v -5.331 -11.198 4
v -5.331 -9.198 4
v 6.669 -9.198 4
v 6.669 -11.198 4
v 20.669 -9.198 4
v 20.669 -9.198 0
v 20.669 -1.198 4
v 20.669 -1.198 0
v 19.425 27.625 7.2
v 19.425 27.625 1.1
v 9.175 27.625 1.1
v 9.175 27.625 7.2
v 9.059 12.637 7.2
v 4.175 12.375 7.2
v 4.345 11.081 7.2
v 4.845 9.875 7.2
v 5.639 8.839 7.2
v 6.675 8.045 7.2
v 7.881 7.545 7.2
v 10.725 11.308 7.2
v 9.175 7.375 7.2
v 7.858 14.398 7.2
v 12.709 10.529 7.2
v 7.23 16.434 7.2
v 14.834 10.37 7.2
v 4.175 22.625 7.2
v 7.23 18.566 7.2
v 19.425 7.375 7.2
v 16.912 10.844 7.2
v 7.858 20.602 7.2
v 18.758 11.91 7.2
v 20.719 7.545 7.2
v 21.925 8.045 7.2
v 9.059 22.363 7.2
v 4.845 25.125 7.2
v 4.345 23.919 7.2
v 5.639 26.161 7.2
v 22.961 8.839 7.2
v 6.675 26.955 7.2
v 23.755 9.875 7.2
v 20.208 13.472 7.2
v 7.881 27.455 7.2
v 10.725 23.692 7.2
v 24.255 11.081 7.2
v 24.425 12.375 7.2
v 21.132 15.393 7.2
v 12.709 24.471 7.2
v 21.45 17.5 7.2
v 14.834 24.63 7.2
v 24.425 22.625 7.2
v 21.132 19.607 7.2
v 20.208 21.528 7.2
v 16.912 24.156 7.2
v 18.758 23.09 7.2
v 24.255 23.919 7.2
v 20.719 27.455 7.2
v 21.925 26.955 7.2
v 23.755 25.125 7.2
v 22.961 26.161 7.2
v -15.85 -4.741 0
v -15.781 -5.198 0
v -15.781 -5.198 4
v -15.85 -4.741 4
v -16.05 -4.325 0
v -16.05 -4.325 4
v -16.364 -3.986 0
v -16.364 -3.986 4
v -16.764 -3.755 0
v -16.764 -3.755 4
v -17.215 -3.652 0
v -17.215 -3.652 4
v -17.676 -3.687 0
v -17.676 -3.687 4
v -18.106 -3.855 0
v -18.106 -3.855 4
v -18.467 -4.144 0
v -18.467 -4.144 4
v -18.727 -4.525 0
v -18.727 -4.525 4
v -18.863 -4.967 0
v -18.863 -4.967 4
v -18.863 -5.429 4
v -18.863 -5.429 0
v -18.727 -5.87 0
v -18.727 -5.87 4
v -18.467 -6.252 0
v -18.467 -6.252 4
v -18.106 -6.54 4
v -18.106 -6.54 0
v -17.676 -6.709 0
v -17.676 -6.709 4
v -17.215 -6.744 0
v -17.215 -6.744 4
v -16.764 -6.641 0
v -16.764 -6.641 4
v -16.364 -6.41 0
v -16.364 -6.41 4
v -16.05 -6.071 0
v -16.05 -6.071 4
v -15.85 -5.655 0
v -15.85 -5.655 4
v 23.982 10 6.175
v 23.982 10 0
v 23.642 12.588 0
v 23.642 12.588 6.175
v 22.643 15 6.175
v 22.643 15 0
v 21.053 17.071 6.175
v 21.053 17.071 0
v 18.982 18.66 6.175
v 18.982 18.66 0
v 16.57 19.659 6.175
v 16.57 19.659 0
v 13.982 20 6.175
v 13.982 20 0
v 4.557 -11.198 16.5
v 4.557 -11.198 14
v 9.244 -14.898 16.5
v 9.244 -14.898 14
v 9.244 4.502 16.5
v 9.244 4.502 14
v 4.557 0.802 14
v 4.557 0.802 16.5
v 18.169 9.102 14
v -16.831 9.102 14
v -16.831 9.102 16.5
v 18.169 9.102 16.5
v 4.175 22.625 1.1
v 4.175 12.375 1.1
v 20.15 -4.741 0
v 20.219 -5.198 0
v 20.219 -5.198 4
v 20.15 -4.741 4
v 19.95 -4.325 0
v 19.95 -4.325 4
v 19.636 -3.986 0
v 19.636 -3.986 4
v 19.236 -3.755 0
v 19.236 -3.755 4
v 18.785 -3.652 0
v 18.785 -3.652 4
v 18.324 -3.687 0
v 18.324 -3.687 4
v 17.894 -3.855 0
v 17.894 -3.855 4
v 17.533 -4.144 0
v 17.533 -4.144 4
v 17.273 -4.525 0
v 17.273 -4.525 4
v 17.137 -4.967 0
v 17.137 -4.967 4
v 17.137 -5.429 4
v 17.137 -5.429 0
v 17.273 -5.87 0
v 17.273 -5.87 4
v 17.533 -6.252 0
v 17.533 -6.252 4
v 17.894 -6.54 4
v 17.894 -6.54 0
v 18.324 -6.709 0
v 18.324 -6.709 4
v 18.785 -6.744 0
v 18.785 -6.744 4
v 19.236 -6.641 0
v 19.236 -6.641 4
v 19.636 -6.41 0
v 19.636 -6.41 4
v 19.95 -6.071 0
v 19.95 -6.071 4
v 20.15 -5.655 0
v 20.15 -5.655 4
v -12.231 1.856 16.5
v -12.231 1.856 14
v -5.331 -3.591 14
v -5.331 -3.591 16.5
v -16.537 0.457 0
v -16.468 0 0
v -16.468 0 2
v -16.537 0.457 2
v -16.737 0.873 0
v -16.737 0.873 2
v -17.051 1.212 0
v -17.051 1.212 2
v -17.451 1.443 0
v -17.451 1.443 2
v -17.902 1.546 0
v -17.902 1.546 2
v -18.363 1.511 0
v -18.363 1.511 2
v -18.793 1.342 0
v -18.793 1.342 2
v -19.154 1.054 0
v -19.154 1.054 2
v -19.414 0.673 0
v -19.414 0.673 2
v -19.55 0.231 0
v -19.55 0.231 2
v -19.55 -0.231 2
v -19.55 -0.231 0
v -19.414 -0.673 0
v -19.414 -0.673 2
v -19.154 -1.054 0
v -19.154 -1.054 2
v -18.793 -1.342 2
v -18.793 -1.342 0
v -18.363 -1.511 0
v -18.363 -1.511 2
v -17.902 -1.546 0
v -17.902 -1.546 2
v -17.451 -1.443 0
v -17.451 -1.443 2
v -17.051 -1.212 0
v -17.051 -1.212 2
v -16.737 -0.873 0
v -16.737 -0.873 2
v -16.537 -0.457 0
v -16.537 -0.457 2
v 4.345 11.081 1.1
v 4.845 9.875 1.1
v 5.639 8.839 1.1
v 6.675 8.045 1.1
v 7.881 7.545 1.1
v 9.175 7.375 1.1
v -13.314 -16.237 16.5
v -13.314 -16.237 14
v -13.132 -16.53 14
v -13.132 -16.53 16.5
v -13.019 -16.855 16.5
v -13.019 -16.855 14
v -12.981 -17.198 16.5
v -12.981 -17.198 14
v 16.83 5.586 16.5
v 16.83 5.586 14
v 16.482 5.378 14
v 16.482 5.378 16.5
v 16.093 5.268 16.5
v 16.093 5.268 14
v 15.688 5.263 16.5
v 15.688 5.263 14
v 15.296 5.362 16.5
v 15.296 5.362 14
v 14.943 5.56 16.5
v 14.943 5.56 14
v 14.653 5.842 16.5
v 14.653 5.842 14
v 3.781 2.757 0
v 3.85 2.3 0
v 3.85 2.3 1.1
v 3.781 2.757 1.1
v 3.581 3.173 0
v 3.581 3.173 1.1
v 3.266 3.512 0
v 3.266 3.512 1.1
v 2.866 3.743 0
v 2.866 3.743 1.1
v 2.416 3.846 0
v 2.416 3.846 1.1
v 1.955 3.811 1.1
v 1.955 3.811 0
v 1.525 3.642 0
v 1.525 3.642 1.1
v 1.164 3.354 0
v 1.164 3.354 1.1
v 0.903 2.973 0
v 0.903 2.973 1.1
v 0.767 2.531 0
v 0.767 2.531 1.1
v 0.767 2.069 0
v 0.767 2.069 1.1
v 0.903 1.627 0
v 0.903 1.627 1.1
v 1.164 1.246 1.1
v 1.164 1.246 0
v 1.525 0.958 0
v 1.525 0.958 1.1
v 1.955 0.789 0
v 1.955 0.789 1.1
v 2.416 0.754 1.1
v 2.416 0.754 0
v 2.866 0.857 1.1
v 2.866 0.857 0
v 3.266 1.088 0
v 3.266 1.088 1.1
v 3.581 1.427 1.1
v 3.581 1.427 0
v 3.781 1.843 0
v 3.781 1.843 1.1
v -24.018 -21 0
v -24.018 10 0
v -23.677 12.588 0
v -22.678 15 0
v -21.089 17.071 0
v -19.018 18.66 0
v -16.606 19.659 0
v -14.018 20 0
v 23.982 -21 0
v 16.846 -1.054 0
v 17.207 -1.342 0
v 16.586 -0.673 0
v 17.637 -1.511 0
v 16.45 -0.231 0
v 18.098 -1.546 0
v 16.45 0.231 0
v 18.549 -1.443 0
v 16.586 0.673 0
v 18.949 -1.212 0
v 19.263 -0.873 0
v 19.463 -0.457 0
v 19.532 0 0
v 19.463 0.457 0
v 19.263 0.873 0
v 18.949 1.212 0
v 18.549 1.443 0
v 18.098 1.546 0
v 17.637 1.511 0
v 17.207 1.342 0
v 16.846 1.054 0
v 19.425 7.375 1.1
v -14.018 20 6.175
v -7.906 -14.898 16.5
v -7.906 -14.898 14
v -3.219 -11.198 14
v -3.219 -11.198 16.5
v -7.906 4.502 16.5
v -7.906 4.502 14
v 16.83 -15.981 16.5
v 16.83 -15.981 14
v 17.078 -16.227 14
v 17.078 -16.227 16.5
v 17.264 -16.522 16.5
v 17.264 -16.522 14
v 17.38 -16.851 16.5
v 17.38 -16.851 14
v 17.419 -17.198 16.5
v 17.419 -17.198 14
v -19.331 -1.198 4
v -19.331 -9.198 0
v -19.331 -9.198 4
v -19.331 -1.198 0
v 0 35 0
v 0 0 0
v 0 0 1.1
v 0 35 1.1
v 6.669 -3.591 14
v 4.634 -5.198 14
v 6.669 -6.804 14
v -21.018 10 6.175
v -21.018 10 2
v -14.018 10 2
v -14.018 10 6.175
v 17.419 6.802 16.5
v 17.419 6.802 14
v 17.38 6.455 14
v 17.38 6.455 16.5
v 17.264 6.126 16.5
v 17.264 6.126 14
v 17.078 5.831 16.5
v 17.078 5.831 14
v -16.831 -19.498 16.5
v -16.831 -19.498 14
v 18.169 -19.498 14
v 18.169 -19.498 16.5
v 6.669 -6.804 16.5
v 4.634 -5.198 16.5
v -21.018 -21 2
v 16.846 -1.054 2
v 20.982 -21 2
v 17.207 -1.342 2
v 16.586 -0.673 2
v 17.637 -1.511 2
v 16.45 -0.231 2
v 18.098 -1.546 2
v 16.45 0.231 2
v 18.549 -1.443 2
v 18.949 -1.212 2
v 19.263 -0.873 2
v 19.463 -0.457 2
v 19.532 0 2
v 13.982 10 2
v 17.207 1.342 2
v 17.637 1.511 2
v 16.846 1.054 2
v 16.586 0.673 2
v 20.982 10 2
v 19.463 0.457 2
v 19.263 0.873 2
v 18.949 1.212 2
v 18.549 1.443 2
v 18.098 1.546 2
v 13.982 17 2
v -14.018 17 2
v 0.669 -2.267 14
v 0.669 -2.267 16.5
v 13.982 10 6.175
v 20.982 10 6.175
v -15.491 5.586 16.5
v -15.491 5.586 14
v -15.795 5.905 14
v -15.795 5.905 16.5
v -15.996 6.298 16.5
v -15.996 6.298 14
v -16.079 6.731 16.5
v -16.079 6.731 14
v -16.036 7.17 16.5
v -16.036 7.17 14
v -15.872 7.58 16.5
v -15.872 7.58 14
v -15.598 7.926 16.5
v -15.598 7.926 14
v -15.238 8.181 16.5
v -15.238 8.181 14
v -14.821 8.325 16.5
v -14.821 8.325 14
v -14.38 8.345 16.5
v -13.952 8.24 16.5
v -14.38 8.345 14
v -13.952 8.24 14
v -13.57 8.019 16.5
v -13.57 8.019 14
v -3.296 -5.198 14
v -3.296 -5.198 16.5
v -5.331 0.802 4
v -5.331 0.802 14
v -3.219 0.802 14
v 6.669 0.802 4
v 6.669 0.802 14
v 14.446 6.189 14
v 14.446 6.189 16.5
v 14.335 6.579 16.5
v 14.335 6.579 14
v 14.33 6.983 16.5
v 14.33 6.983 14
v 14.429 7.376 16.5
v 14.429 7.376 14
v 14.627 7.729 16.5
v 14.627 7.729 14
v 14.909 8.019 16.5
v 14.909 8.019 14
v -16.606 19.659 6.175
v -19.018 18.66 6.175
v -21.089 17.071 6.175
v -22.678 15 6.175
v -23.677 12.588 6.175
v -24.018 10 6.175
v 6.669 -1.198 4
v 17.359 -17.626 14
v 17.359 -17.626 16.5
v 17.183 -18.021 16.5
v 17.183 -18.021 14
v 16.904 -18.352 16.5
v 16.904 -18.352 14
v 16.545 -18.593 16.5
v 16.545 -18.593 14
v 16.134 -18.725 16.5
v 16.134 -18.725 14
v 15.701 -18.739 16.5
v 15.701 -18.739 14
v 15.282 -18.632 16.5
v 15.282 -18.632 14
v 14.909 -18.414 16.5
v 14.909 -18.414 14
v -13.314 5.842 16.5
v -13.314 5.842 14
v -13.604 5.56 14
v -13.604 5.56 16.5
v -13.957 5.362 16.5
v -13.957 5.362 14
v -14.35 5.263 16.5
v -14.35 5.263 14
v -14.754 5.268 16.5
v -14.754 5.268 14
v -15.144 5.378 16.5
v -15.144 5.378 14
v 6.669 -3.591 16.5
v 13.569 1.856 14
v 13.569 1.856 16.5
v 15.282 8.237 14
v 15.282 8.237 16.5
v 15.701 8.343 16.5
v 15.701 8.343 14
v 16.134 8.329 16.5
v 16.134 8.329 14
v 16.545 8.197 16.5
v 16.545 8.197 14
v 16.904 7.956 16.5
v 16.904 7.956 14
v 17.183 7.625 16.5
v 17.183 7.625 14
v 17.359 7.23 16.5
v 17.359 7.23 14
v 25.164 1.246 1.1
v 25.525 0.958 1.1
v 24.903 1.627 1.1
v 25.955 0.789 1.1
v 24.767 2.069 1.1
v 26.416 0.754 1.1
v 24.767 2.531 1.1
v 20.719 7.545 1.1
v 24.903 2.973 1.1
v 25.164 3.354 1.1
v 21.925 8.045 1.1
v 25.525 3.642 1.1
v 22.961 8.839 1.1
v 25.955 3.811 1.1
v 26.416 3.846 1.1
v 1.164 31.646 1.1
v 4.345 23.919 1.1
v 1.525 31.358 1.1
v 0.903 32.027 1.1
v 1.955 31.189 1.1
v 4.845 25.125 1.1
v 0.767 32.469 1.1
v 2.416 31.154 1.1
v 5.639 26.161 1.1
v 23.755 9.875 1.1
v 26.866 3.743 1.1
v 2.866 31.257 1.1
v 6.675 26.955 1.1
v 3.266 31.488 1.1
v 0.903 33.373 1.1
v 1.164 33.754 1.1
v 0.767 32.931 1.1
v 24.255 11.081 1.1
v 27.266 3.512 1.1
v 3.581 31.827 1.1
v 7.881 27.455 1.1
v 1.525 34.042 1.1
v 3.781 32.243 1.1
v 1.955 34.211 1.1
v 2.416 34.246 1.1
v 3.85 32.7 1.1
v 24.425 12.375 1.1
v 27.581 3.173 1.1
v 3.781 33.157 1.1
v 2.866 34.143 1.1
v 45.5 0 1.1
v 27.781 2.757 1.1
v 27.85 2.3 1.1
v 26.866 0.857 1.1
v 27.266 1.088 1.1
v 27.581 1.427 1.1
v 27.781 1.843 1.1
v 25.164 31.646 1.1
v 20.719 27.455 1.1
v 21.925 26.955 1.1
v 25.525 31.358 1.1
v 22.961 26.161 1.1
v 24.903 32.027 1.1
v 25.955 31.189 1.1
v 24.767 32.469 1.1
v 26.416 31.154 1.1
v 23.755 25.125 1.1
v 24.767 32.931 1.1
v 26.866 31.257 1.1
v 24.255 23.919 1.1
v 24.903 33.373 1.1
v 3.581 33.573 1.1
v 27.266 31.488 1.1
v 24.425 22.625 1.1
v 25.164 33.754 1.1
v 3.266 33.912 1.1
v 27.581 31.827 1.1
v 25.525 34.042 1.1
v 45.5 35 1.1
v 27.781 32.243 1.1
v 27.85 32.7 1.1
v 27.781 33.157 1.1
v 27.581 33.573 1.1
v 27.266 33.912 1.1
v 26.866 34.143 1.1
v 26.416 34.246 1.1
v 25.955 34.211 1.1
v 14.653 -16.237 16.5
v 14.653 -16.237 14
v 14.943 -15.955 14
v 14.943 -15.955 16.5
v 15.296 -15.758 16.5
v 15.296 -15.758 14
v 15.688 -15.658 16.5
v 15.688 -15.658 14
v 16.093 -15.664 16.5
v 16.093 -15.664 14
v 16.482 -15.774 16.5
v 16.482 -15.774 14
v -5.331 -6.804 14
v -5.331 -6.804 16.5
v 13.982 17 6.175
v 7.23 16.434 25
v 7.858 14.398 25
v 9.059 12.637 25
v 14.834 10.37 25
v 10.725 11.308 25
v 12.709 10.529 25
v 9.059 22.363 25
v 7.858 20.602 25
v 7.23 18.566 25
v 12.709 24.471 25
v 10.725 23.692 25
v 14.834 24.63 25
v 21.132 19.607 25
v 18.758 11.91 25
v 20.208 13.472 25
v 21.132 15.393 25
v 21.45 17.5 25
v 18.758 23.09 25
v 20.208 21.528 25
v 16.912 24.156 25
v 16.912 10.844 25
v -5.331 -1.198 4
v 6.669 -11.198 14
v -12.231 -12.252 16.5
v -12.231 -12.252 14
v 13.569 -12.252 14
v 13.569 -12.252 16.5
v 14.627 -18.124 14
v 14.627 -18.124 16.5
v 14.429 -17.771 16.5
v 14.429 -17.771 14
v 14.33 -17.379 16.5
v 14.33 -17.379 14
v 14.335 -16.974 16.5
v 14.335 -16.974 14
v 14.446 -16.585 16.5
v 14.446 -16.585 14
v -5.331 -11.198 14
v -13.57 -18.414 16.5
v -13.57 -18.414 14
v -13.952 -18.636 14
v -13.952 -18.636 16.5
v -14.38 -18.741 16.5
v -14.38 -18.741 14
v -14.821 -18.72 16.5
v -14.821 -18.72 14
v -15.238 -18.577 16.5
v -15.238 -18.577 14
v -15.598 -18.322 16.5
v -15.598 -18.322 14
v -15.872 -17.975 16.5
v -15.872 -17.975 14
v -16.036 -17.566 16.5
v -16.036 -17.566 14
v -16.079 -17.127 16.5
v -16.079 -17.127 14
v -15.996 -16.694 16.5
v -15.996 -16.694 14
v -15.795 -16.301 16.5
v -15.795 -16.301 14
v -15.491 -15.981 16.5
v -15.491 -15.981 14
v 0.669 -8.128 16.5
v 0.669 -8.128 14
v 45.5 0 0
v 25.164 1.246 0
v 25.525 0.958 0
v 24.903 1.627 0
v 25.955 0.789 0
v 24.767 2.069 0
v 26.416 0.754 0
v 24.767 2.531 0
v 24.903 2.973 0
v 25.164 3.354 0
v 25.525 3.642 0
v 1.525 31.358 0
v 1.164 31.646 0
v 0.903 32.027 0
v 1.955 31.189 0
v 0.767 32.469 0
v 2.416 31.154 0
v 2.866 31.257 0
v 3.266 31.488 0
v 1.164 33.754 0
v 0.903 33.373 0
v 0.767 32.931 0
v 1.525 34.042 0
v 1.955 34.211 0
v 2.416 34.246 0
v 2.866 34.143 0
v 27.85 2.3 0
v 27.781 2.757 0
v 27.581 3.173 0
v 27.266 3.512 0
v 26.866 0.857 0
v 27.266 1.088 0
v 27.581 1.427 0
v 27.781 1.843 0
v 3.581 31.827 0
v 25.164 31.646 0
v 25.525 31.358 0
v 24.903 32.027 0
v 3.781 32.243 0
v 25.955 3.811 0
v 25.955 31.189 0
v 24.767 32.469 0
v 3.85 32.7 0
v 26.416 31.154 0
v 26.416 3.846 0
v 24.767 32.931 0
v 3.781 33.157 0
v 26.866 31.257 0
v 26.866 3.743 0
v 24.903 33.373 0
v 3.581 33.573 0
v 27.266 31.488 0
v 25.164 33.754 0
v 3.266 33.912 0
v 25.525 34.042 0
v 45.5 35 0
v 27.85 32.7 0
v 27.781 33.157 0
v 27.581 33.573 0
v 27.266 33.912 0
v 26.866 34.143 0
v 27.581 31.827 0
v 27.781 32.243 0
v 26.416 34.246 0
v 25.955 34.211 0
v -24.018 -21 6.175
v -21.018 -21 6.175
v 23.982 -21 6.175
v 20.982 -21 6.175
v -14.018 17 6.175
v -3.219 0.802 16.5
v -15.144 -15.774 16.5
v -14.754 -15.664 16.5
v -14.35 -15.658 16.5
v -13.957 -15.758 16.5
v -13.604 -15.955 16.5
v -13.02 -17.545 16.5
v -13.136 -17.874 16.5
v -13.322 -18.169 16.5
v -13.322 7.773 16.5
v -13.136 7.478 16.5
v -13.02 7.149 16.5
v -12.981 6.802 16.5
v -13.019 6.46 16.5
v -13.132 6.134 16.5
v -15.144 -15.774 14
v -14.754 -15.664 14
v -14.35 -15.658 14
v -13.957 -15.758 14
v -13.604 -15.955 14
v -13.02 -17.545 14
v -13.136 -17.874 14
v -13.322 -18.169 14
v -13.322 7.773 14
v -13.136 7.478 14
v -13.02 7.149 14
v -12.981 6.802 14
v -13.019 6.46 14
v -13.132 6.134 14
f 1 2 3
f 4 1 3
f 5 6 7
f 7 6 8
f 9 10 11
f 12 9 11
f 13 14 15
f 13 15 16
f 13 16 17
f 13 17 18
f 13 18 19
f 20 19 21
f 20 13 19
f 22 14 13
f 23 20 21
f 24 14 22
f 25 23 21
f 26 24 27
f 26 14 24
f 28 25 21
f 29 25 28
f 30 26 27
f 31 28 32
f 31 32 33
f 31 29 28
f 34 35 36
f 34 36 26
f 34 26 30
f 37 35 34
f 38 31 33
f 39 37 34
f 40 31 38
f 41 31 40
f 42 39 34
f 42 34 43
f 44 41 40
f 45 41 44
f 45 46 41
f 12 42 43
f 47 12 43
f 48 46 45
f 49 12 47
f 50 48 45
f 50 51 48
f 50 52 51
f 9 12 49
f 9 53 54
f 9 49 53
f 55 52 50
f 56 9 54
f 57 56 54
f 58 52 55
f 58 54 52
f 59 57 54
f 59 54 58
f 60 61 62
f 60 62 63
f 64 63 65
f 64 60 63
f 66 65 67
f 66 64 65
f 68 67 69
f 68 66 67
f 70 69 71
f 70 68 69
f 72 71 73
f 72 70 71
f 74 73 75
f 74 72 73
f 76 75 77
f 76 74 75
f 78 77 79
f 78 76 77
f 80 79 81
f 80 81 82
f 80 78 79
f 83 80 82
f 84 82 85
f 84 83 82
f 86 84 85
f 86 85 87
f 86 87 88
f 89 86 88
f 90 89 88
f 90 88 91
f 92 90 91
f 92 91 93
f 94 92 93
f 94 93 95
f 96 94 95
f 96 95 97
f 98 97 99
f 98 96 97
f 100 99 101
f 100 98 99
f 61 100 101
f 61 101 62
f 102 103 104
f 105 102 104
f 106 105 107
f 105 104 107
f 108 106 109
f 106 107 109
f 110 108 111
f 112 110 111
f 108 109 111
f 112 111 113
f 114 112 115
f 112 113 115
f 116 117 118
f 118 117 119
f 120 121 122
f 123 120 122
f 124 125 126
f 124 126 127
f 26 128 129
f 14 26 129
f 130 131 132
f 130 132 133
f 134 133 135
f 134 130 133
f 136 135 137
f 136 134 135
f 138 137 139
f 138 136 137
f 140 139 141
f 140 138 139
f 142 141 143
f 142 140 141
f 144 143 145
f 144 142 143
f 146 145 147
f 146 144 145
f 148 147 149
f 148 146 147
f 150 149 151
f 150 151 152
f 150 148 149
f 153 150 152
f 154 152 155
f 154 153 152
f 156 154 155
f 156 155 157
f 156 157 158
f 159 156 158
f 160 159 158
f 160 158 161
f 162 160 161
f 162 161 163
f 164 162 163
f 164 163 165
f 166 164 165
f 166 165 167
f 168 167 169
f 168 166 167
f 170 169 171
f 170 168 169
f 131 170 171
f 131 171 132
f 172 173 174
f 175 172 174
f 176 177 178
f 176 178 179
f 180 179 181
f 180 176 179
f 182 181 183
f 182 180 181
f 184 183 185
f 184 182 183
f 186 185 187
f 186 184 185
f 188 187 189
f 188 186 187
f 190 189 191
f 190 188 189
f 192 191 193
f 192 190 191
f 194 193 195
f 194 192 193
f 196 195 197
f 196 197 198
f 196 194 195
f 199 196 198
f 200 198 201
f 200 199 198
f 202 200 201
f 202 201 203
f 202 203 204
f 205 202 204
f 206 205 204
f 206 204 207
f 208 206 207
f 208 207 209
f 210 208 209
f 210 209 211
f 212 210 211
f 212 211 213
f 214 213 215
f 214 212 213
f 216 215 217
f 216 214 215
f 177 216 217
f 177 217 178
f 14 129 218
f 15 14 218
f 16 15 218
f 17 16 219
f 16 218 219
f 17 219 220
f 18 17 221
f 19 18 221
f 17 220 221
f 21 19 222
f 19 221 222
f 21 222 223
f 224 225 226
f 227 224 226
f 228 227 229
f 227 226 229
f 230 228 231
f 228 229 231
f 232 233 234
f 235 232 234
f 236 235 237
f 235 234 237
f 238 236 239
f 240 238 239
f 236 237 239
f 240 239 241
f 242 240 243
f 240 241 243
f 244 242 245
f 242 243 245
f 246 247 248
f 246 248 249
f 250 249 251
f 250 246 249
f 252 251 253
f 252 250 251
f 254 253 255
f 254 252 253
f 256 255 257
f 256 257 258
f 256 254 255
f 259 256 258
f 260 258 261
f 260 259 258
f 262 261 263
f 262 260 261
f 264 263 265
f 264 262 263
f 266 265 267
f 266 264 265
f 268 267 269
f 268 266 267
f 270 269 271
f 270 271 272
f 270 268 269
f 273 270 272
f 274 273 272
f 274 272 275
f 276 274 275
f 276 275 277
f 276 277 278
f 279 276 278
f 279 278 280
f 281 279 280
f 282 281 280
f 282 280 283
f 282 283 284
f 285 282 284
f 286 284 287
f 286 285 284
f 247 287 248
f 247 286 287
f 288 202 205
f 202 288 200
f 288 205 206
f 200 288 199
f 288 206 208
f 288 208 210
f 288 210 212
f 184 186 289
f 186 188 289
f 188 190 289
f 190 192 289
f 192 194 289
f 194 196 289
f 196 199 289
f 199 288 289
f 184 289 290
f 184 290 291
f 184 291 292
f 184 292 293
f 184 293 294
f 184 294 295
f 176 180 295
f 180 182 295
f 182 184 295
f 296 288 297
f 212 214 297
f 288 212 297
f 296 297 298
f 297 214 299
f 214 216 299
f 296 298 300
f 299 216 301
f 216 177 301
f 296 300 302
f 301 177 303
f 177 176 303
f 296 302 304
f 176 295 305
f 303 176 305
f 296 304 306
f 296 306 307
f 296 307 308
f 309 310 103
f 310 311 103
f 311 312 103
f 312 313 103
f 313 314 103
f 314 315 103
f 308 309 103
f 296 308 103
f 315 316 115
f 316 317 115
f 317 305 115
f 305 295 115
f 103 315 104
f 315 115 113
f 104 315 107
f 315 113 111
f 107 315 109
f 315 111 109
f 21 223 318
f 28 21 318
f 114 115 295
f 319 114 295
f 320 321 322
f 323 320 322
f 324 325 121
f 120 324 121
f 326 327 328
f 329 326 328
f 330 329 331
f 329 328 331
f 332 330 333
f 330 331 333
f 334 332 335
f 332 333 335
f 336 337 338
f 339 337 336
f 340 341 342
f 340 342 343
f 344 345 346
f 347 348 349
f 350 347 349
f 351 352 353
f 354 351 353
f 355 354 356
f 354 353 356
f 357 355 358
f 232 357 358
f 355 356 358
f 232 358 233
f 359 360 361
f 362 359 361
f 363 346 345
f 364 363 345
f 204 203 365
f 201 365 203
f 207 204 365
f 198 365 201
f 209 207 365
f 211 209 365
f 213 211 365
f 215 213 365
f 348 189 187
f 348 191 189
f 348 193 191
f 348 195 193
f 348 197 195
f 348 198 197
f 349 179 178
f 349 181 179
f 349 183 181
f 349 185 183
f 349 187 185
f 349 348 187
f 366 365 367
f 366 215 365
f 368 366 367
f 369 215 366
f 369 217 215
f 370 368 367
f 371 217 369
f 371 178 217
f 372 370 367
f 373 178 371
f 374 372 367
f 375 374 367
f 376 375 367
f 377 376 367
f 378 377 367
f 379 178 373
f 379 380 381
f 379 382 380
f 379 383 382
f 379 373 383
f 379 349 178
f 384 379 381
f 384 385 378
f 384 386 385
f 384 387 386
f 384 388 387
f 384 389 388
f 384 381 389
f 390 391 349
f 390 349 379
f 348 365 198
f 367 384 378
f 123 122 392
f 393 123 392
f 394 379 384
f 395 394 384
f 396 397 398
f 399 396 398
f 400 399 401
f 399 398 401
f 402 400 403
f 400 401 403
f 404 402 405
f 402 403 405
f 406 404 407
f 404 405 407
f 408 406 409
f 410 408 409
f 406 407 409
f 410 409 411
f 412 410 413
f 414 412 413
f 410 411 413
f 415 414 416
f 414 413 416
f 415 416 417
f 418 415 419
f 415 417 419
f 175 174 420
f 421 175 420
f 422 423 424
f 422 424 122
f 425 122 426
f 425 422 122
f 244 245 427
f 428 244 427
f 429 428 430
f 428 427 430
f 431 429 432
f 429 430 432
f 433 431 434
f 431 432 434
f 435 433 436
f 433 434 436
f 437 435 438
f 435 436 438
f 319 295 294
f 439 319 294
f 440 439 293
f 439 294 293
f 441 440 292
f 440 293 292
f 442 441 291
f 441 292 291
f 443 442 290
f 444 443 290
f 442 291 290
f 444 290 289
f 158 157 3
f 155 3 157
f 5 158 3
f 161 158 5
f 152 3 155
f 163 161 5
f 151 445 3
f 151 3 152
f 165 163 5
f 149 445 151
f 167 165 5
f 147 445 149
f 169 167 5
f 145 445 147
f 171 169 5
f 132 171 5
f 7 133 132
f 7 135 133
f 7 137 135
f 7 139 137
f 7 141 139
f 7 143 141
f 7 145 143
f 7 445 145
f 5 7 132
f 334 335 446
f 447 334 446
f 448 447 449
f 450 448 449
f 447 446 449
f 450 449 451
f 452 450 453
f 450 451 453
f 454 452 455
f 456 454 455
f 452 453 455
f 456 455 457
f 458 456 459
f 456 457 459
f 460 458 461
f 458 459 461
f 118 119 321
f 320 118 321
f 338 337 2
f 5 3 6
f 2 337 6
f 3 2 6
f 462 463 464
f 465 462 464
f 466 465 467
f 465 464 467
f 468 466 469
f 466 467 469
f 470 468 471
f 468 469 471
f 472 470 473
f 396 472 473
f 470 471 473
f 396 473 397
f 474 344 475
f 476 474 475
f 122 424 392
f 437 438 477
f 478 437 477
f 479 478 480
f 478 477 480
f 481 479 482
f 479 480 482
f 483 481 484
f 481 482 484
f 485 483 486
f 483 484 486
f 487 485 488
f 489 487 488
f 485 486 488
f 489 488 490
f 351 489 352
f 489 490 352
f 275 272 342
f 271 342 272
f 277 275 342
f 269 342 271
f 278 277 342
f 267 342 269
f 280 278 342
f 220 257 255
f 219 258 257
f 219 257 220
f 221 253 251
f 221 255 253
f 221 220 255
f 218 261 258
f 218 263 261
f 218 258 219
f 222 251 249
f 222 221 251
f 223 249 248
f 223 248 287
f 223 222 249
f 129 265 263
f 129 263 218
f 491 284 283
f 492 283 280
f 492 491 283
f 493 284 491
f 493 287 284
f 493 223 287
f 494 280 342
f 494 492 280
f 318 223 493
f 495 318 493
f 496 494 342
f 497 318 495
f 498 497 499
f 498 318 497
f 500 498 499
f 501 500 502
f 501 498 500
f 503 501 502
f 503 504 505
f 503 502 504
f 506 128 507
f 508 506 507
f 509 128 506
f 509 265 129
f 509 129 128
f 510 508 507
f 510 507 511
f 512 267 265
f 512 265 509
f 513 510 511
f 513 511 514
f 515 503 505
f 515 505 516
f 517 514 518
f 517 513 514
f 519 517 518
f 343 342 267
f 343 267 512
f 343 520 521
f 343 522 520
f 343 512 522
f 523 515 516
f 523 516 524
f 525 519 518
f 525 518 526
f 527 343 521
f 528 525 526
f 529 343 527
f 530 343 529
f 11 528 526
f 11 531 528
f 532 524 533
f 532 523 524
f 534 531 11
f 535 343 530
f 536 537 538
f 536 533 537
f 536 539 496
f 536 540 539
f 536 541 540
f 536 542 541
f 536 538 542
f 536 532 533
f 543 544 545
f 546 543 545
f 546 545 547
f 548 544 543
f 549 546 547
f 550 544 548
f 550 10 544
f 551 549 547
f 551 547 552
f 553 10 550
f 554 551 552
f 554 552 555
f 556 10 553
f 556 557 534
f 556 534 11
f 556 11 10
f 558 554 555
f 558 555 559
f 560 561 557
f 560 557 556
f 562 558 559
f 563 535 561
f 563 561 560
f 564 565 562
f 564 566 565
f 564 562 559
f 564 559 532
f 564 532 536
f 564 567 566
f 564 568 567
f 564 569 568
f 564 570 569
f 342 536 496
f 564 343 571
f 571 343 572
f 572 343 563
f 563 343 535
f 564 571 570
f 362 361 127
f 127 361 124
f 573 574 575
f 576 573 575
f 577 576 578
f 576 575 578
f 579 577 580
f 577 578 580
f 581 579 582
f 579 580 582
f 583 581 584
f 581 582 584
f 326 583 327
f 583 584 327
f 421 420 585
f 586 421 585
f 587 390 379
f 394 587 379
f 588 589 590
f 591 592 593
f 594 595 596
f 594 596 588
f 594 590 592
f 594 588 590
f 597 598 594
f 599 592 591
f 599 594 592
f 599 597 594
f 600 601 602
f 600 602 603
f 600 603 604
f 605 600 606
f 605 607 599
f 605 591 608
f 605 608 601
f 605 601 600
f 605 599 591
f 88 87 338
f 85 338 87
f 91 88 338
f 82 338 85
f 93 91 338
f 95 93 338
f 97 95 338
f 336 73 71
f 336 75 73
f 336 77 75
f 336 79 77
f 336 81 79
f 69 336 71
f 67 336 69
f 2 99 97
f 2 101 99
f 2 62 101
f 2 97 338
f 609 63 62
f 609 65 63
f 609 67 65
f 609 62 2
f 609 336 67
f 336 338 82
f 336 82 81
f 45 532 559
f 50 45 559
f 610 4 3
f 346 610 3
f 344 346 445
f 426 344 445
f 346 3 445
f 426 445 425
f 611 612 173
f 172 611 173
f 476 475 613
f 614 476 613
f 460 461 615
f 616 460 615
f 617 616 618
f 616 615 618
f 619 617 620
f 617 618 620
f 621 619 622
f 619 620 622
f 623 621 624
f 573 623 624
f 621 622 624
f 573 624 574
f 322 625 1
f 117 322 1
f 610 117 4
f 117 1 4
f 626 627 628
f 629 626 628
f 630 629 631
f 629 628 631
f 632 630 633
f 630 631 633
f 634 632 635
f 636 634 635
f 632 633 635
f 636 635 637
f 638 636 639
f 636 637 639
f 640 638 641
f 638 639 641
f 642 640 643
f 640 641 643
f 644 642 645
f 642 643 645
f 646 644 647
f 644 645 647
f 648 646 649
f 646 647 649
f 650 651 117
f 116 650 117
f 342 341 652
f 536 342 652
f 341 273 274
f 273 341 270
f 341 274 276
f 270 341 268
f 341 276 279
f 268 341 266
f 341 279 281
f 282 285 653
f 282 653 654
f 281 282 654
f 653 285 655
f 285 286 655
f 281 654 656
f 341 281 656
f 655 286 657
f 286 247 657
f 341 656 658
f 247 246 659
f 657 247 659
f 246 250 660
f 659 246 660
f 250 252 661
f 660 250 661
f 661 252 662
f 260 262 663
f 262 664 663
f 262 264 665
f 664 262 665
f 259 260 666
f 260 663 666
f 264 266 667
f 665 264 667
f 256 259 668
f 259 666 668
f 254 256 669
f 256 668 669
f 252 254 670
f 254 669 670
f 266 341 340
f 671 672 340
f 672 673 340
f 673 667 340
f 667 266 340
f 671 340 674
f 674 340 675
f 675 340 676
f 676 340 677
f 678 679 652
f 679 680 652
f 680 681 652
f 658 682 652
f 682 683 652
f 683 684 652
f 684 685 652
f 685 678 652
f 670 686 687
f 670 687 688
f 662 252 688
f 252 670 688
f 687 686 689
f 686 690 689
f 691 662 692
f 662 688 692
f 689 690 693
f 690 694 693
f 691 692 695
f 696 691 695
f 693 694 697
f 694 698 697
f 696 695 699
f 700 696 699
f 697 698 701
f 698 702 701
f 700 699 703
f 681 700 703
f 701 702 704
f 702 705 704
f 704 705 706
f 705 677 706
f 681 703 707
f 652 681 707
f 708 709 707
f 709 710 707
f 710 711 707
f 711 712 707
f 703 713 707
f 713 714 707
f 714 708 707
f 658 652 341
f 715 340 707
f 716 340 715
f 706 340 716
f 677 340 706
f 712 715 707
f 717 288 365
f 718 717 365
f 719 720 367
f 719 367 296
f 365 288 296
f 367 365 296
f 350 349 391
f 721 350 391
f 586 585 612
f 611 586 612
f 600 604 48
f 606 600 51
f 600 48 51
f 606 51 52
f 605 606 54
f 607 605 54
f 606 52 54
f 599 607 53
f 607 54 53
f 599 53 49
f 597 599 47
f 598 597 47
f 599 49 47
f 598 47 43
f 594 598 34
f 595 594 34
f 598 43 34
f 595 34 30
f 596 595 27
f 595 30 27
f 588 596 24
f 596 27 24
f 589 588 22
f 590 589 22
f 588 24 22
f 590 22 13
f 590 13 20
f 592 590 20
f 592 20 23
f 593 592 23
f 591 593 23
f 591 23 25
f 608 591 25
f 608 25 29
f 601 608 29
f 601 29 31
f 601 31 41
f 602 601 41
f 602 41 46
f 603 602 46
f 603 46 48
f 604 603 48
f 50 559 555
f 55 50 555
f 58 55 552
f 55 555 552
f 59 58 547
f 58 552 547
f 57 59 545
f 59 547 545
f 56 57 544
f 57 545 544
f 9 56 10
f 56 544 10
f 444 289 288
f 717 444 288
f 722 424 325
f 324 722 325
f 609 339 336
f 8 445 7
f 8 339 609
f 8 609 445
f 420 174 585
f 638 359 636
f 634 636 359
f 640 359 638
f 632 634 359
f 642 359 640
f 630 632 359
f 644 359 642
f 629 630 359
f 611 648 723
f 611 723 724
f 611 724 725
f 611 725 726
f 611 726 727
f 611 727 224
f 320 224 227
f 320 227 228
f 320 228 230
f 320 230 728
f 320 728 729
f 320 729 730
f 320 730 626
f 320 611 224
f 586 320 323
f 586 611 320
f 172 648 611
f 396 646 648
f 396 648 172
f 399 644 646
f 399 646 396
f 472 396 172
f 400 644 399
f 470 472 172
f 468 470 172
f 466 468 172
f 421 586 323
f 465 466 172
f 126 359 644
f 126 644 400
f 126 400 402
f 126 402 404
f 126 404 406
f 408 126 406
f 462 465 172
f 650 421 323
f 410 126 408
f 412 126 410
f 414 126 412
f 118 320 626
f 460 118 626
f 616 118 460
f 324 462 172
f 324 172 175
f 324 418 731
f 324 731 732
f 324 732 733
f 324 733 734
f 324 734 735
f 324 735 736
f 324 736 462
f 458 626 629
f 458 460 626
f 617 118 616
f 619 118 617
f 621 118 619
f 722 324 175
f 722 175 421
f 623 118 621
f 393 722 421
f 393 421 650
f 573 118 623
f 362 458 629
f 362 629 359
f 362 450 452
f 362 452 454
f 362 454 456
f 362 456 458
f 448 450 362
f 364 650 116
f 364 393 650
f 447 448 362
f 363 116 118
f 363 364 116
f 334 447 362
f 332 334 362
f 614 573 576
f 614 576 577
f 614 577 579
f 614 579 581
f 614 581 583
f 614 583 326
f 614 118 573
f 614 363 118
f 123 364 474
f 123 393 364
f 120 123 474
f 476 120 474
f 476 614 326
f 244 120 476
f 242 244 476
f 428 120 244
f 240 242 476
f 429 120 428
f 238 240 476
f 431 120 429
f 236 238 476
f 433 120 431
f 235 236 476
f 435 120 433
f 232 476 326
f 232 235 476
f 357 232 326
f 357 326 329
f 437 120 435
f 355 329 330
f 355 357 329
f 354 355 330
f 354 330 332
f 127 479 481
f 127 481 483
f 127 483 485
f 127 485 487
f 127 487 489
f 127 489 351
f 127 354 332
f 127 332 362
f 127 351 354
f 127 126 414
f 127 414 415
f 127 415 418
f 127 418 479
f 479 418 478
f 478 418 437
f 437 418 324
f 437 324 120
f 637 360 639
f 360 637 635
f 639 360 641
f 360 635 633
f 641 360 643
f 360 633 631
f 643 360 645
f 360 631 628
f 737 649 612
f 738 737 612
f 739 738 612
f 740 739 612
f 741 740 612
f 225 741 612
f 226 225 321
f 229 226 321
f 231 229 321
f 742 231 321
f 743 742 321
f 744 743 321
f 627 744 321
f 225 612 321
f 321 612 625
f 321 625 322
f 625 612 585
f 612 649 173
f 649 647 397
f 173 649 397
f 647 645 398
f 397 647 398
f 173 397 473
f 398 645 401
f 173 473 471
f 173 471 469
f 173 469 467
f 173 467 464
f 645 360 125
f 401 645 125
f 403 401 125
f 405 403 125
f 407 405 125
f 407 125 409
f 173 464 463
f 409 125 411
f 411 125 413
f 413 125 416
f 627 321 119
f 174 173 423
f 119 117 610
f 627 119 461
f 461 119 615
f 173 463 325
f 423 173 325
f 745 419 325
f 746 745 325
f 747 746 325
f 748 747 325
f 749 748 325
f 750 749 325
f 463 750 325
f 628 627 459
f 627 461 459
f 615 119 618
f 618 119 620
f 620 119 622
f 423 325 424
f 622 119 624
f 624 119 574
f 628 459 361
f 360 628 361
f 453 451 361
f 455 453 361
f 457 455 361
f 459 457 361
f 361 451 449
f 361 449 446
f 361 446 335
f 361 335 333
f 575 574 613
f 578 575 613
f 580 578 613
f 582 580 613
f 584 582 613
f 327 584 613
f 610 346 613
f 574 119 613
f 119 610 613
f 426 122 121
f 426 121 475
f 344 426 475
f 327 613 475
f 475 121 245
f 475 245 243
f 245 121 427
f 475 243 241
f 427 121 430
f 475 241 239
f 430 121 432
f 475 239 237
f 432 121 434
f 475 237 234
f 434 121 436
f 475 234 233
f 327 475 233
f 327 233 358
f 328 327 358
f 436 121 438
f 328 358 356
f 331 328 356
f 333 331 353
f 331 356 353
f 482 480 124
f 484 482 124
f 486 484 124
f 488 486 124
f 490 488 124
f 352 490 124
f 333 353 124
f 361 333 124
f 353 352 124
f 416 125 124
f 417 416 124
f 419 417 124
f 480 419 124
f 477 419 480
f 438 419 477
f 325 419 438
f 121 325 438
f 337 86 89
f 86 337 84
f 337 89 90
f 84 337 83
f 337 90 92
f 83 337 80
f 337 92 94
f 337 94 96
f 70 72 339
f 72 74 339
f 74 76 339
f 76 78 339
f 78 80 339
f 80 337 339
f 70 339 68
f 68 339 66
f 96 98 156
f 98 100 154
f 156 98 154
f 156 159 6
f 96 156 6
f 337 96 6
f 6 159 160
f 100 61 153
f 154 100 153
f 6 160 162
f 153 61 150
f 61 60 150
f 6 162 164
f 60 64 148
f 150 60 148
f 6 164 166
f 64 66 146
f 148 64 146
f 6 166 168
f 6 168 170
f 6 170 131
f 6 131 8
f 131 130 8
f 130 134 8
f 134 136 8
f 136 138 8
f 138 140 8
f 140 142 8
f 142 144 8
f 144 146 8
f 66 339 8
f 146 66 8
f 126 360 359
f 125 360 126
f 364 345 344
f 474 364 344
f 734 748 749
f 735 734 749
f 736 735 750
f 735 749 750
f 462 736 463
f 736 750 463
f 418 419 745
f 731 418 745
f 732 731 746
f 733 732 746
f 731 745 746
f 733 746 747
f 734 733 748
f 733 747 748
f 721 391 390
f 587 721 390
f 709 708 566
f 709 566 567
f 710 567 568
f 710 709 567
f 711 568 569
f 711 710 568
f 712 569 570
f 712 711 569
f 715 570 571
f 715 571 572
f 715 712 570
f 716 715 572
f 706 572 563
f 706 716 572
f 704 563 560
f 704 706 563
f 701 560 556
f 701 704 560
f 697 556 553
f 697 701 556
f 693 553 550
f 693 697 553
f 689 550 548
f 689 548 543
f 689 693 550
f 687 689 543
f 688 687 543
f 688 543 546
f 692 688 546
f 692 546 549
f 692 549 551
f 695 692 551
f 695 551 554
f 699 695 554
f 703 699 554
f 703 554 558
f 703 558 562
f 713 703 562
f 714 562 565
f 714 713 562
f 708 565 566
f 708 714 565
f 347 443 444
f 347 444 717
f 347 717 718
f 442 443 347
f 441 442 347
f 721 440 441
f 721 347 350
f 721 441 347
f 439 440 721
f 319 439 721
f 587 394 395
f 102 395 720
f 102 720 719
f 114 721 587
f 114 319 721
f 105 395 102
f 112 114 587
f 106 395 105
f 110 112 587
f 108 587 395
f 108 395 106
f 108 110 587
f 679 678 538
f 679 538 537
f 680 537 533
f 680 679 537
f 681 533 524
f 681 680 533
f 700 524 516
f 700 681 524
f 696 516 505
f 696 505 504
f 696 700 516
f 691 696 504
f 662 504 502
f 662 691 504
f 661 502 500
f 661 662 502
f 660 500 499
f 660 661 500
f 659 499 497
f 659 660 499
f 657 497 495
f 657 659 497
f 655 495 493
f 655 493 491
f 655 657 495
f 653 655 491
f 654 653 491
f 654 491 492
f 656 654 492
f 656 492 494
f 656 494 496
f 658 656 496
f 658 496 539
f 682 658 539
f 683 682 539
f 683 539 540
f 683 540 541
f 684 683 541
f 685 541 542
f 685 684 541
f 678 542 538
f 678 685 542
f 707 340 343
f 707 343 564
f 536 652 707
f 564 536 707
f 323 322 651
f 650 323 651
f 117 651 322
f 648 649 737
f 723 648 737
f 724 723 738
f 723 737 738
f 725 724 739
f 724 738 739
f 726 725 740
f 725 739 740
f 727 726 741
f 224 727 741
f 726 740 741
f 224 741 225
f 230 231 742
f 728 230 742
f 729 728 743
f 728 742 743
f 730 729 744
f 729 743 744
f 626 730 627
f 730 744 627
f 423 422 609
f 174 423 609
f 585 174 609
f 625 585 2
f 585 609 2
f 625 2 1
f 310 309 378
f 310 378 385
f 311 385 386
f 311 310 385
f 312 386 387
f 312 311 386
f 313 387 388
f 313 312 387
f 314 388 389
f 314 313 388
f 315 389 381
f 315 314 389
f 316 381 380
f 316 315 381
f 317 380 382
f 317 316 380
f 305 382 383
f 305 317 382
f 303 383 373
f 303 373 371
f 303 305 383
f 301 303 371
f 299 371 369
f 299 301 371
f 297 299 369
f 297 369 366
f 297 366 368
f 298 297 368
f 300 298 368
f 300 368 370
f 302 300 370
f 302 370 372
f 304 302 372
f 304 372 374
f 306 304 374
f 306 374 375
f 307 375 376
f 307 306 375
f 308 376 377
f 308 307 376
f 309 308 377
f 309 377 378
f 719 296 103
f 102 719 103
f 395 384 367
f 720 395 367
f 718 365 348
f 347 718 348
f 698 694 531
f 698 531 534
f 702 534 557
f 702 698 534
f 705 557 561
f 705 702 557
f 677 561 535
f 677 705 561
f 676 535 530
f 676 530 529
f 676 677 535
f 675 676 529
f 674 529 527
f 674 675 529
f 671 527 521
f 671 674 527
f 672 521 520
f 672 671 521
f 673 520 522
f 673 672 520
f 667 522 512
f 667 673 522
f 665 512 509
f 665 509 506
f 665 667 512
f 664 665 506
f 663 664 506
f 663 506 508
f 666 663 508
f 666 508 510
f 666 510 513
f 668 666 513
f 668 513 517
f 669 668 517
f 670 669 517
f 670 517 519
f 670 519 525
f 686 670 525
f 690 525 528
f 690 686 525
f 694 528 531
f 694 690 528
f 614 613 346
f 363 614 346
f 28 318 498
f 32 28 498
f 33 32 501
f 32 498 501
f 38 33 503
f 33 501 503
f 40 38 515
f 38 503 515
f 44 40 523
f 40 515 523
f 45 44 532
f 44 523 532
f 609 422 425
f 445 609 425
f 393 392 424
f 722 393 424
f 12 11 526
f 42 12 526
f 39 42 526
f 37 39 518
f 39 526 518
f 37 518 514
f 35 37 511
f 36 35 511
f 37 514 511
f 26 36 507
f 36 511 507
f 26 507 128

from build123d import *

# Parameters (mm, degrees)
F0_W      = 45.5
F0_H      = 35
F0_R      = 1.55
F1_DEPTH  = 1.1
F0_R_2    = 7.15
F2_DEPTH  = 7.2
F3_DEPTH  = 25
F4_R      = 1.55
F5_DEPTH  = 2
F6_DEPTH  = 6.175
F7_W      = 40
F7_H      = 8
F7_R      = 1.55
F8_DEPTH  = 4
F9_W      = 12
F9_H      = 2
F9_H_2    = 8
F10_DEPTH = 10
F11_W     = 35
F11_H     = 28.6
F12_DEPTH = 2.5


with BuildPart() as f1:
    # F0 (on Top) → F1 (new body)
    with BuildSketch(Plane.XY):
        with Locations((22.75, 17.5)):
            Rectangle(F0_W, F0_H)
        with Locations((2.3, 2.3)):
            Circle(F0_R, mode=Mode.SUBTRACT)
        with Locations((26.3, 2.3)):
            Circle(F0_R, mode=Mode.SUBTRACT)
        with BuildLine():
            Line((9.175, 27.625), (19.425, 27.625))
            ThreePointArc((19.425, 27.625), (22.9605339059, 26.1605339059), (24.425, 22.625))
            Line((24.425, 22.625), (24.425, 12.375))
            ThreePointArc((24.425, 12.375), (22.9605339059, 8.8394660941), (19.425, 7.375))
            Line((19.425, 7.375), (9.175, 7.375))
            ThreePointArc((9.175, 7.375), (5.6394660941, 8.8394660941), (4.175, 12.375))
            Line((4.175, 12.375), (4.175, 22.625))
            ThreePointArc((4.175, 22.625), (5.6394660941, 26.1605339059), (9.175, 27.625))
        make_face(mode=Mode.SUBTRACT)
        with Locations((2.3, 32.7)):
            Circle(F0_R, mode=Mode.SUBTRACT)
        with Locations((26.3, 32.7)):
            Circle(F0_R, mode=Mode.SUBTRACT)
    extrude(amount=F1_DEPTH)

    # F0 (on Top) → F2 (join)
    with BuildSketch(Plane.XY):
        with BuildLine():
            ThreePointArc((24.425, 22.625), (22.9605339059, 26.1605339059), (19.425, 27.625))
            Line((19.425, 27.625), (9.175, 27.625))
            ThreePointArc((9.175, 27.625), (5.6394660941, 26.1605339059), (4.175, 22.625))
            Line((4.175, 22.625), (4.175, 12.375))
            ThreePointArc((4.175, 12.375), (5.6394660941, 8.8394660941), (9.175, 7.375))
            Line((9.175, 7.375), (19.425, 7.375))
            ThreePointArc((19.425, 7.375), (22.9605339059, 8.8394660941), (24.425, 12.375))
            Line((24.425, 12.375), (24.425, 22.625))
        make_face()
        with Locations((14.3, 17.5)):
            Circle(F0_R_2, mode=Mode.SUBTRACT)
    extrude(amount=F2_DEPTH)

    # F0 (on Top) → F3 (join)
    with BuildSketch(Plane.XY):
        with Locations((14.3, 17.5)):
            Circle(F0_R_2)
    extrude(amount=F3_DEPTH)


with BuildPart() as f5:
    # F4 (on Top) → F5 (new body)
    with BuildSketch(Plane.XY):
        Polygon((-21.0177182555, 10), (-21.0177182555, -21), (20.9822817445, -21), (20.9822817445, 10), (13.9822817445, 10), (13.9822817445, 17), (-14.0177182555, 17), (-14.0177182555, 10), align=None)
        with Locations((-18.0177182555, 0)):
            Circle(F4_R, mode=Mode.SUBTRACT)
        with Locations((17.9822817445, 0)):
            Circle(F4_R, mode=Mode.SUBTRACT)
    extrude(amount=F5_DEPTH)

    # F4 (on Top) → F6 (join)
    with BuildSketch(Plane.XY):
        with BuildLine():
            Line((13.9822817445, 20), (-14.0177182555, 20))
            ThreePointArc((-14.0177182555, 20), (-21.0887860674, 17.0710678119), (-24.0177182555, 10))
            Line((-24.0177182555, 10), (-24.0177182555, -21))
            Line((-24.0177182555, -21), (-21.0177182555, -21))
            Line((-21.0177182555, -21), (-21.0177182555, 10))
            ThreePointArc((-21.0177182555, 10), (-18.9674657238, 14.9497474683), (-14.0177182555, 17))
            Line((-14.0177182555, 17), (13.9822817445, 17))
            ThreePointArc((13.9822817445, 17), (18.9320292128, 14.9497474683), (20.9822817445, 10))
            Line((20.9822817445, 10), (20.9822817445, -21))
            Line((20.9822817445, -21), (23.9822817445, -21))
            Line((23.9822817445, -21), (23.9822817445, 10))
            ThreePointArc((23.9822817445, 10), (21.0533495563, 17.0710678119), (13.9822817445, 20))
        make_face()
        with BuildLine():
            Line((13.9822817445, 10), (20.9822817445, 10))
            ThreePointArc((20.9822817445, 10), (18.9320292128, 14.9497474683), (13.9822817445, 17))
            Line((13.9822817445, 17), (13.9822817445, 10))
        make_face()
        with BuildLine():
            ThreePointArc((-14.0177182555, 17), (-18.9674657238, 14.9497474683), (-21.0177182555, 10))
            Line((-21.0177182555, 10), (-14.0177182555, 10))
            Line((-14.0177182555, 10), (-14.0177182555, 17))
        make_face()
    extrude(amount=F6_DEPTH)


with BuildPart() as f8:
    # F7 (on Top) → F8 (new body)
    with BuildSketch(Plane.XY):
        with Locations((0.6692926586, -5.1978348792)):
            Rectangle(F7_W, F7_H)
        with Locations((-17.3307073414, -5.1978348792)):
            Circle(F7_R, mode=Mode.SUBTRACT)
        with Locations((18.6692926586, -5.1978348792)):
            Circle(F7_R, mode=Mode.SUBTRACT)
    extrude(amount=F8_DEPTH)

    # F9 (on face) → F10 (join)
    with BuildSketch(Plane.XY.offset(4)):
        with Locations((0.6692926586, -0.1978348792)):
            Rectangle(F9_W, F9_H)
        with Locations((0.6692926586, -10.1978348792)):
            Rectangle(F9_W, F9_H)
        with Locations((0.6692926586, -5.1978348792)):
            Rectangle(F9_W, F9_H_2)
    extrude(amount=F10_DEPTH)

    # F11 (on face) → F12 (join)
    with BuildSketch(Plane.XY.offset(14)):
        with Locations((0.6692926586, -5.1978348792)):
            Rectangle(F11_W, F11_H)
        with BuildLine():
            Line((-12.2307073414, -12.2517855581), (-12.2307073414, 1.8561157997))
            Line((-12.2307073414, 1.8561157997), (-16.0531033423, 4.8737968531))
            Line((-16.0531033423, 4.8737968531), (-15.4911559887, 5.5855968343))
            ThreePointArc((-15.4911559887, 5.5855968343), (-15.747275628, 7.7626137681), (-13.5702586941, 8.0187334074))
            Line((-13.5702586941, 8.0187334074), (-13.1055254777, 8.6073954816))
            Line((-13.1055254777, 8.6073954816), (-7.9055670208, 4.5021651208))
            Line((-7.9055670208, 4.5021651208), (9.2441523379, 4.5021651208))
            Line((9.2441523379, 4.5021651208), (14.4441107948, 8.6073954816))
            Line((14.4441107948, 8.6073954816), (14.9088440113, 8.0187334074))
            ThreePointArc((14.9088440113, 8.0187334074), (16.5452381433, 8.1970119589), (17.4192926586, 6.8021651208))
            ThreePointArc((17.4192926586, 6.8021651208), (17.2641394966, 6.1262196361), (16.8297413059, 5.5855968343))
            Line((16.8297413059, 5.5855968343), (17.3916886594, 4.8737968531))
            Line((17.3916886594, 4.8737968531), (13.5692926586, 1.8561157997))
            Line((13.5692926586, 1.8561157997), (13.5692926586, -12.2517855581))
            Line((13.5692926586, -12.2517855581), (17.3916886594, -15.2694666114))
            Line((17.3916886594, -15.2694666114), (16.8297413059, -15.9812665926))
            ThreePointArc((16.8297413059, -15.9812665926), (17.2641394966, -16.5218893944), (17.4192926586, -17.1978348792))
            ThreePointArc((17.4192926586, -17.1978348792), (16.5452381433, -18.5926817172), (14.9088440113, -18.4144031657))
            Line((14.9088440113, -18.4144031657), (14.4441107948, -19.0030652399))
            Line((14.4441107948, -19.0030652399), (9.2441523379, -14.8978348792))
            Line((9.2441523379, -14.8978348792), (-7.9055670208, -14.8978348792))
            Line((-7.9055670208, -14.8978348792), (-13.1055254777, -19.0030652399))
            Line((-13.1055254777, -19.0030652399), (-13.5702586941, -18.4144031657))
            ThreePointArc((-13.5702586941, -18.4144031657), (-15.747275628, -18.1582835265), (-15.4911559887, -15.9812665926))
            Line((-15.4911559887, -15.9812665926), (-16.0531033423, -15.2694666114))
            Line((-16.0531033423, -15.2694666114), (-12.2307073414, -12.2517855581))
        make_face(mode=Mode.SUBTRACT)
        Polygon((12.9559593252, 4.5021651208), (9.2441523379, 4.5021651208), (4.5574856712, 0.8021651208), (6.6692926586, 0.8021651208), (6.6692926586, -0.4609927739), align=None)
        Polygon((13.5692926586, 4.5021651208), (12.9559593252, 4.5021651208), (6.6692926586, -0.4609927739), (6.6692926586, -3.5912526213), (13.5692926586, 1.8561157997), align=None)
        Polygon((-5.3307073414, 0.8021651208), (-5.3307073414, -0.4609927739), (0.6692926586, -5.1978348792), (6.6692926586, -0.4609927739), (6.6692926586, 0.8021651208), (4.5574856712, 0.8021651208), (0.6692926586, -2.2674609418), (-3.2189003541, 0.8021651208), align=None)
        Polygon((6.6692926586, -0.4609927739), (0.6692926586, -5.1978348792), (6.6692926586, -9.9346769844), (6.6692926586, -6.804417137), (4.6342884653, -5.1978348792), (6.6692926586, -3.5912526213), align=None)
        Polygon((-7.9055670208, 4.5021651208), (-11.6173740081, 4.5021651208), (-5.3307073414, -0.4609927739), (-5.3307073414, 0.8021651208), (-3.2189003541, 0.8021651208), align=None)
        Polygon((-11.6173740081, 4.5021651208), (-12.2307073414, 4.5021651208), (-12.2307073414, 1.8561157997), (-5.3307073414, -3.5912526213), (-5.3307073414, -0.4609927739), align=None)
        Polygon((-5.3307073414, -6.804417137), (-12.2307073414, -12.2517855581), (-12.2307073414, -14.8978348792), (-11.6173740081, -14.8978348792), (-5.3307073414, -9.9346769844), align=None)
        Polygon((-5.3307073414, -9.9346769844), (-11.6173740081, -14.8978348792), (-7.9055670208, -14.8978348792), (-3.2189003541, -11.1978348792), (-5.3307073414, -11.1978348792), align=None)
        Polygon((6.6692926586, -9.9346769844), (0.6692926586, -5.1978348792), (-5.3307073414, -9.9346769844), (-5.3307073414, -11.1978348792), (-3.2189003541, -11.1978348792), (0.6692926586, -8.1282088165), (4.5574856712, -11.1978348792), (6.6692926586, -11.1978348792), align=None)
        Polygon((-5.3307073414, -0.4609927739), (-5.3307073414, -3.5912526213), (-3.2957031482, -5.1978348792), (-5.3307073414, -6.804417137), (-5.3307073414, -9.9346769844), (0.6692926586, -5.1978348792), align=None)
        Polygon((12.9559593252, -14.8978348792), (6.6692926586, -9.9346769844), (6.6692926586, -11.1978348792), (4.5574856712, -11.1978348792), (9.2441523379, -14.8978348792), align=None)
        Polygon((6.6692926586, -6.804417137), (6.6692926586, -9.9346769844), (12.9559593252, -14.8978348792), (13.5692926586, -14.8978348792), (13.5692926586, -12.2517855581), align=None)
        with BuildLine():
            Line((-12.2307073414, 1.8561157997), (-12.2307073414, 4.5021651208))
            Line((-12.2307073414, 4.5021651208), (-11.6173740081, 4.5021651208))
            Line((-11.6173740081, 4.5021651208), (-13.3141390549, 5.8417164735))
            ThreePointArc((-13.3141390549, 5.8417164735), (-14.3496034077, 5.2627816841), (-15.4911559887, 5.5855968343))
            Line((-15.4911559887, 5.5855968343), (-16.0531033423, 4.8737968531))
            Line((-16.0531033423, 4.8737968531), (-12.2307073414, 1.8561157997))
        make_face()
        with BuildLine():
            Line((-13.3141390549, 5.8417164735), (-11.6173740081, 4.5021651208))
            Line((-11.6173740081, 4.5021651208), (-7.9055670208, 4.5021651208))
            Line((-7.9055670208, 4.5021651208), (-13.1055254777, 8.6073954816))
            Line((-13.1055254777, 8.6073954816), (-13.5702586941, 8.0187334074))
            ThreePointArc((-13.5702586941, 8.0187334074), (-13.1358605034, 7.4781106056), (-12.9807073414, 6.8021651208))
            ThreePointArc((-12.9807073414, 6.8021651208), (-13.0664360475, 6.2938250989), (-13.3141390549, 5.8417164735))
        make_face()
        with BuildLine():
            Line((-12.2307073414, -14.8978348792), (-12.2307073414, -12.2517855581))
            Line((-12.2307073414, -12.2517855581), (-16.0531033423, -15.2694666114))
            Line((-16.0531033423, -15.2694666114), (-15.4911559887, -15.9812665926))
            ThreePointArc((-15.4911559887, -15.9812665926), (-14.3496034077, -15.6584514425), (-13.3141390549, -16.2373862319))
            Line((-13.3141390549, -16.2373862319), (-11.6173740081, -14.8978348792))
            Line((-11.6173740081, -14.8978348792), (-12.2307073414, -14.8978348792))
        make_face()
        with BuildLine():
            Line((-7.9055670208, -14.8978348792), (-11.6173740081, -14.8978348792))
            Line((-11.6173740081, -14.8978348792), (-13.3141390549, -16.2373862319))
            ThreePointArc((-13.3141390549, -16.2373862319), (-13.0664360475, -16.6894948572), (-12.9807073414, -17.1978348792))
            ThreePointArc((-12.9807073414, -17.1978348792), (-13.1358605034, -17.8737803639), (-13.5702586941, -18.4144031657))
            Line((-13.5702586941, -18.4144031657), (-13.1055254777, -19.0030652399))
            Line((-13.1055254777, -19.0030652399), (-7.9055670208, -14.8978348792))
        make_face()
        with BuildLine():
            Line((14.652724372, -16.2373862319), (12.9559593252, -14.8978348792))
            Line((12.9559593252, -14.8978348792), (9.2441523379, -14.8978348792))
            Line((9.2441523379, -14.8978348792), (14.4441107948, -19.0030652399))
            Line((14.4441107948, -19.0030652399), (14.9088440113, -18.4144031657))
            ThreePointArc((14.9088440113, -18.4144031657), (14.3299092219, -17.3789388129), (14.652724372, -16.2373862319))
        make_face()
        with BuildLine():
            Line((13.5692926586, -14.8978348792), (12.9559593252, -14.8978348792))
            Line((12.9559593252, -14.8978348792), (14.652724372, -16.2373862319))
            ThreePointArc((14.652724372, -16.2373862319), (15.6881887248, -15.6584514425), (16.8297413059, -15.9812665926))
            Line((16.8297413059, -15.9812665926), (17.3916886594, -15.2694666114))
            Line((17.3916886594, -15.2694666114), (13.5692926586, -12.2517855581))
            Line((13.5692926586, -12.2517855581), (13.5692926586, -14.8978348792))
        make_face()
        with BuildLine():
            Line((14.4441107948, 8.6073954816), (9.2441523379, 4.5021651208))
            Line((9.2441523379, 4.5021651208), (12.9559593252, 4.5021651208))
            Line((12.9559593252, 4.5021651208), (14.652724372, 5.8417164735))
            ThreePointArc((14.652724372, 5.8417164735), (14.3299092219, 6.9832690546), (14.9088440113, 8.0187334074))
            Line((14.9088440113, 8.0187334074), (14.4441107948, 8.6073954816))
        make_face()
        with BuildLine():
            Line((14.652724372, 5.8417164735), (12.9559593252, 4.5021651208))
            Line((12.9559593252, 4.5021651208), (13.5692926586, 4.5021651208))
            Line((13.5692926586, 4.5021651208), (13.5692926586, 1.8561157997))
            Line((13.5692926586, 1.8561157997), (17.3916886594, 4.8737968531))
            Line((17.3916886594, 4.8737968531), (16.8297413059, 5.5855968343))
            ThreePointArc((16.8297413059, 5.5855968343), (15.6881887248, 5.2627816841), (14.652724372, 5.8417164735))
        make_face()
    extrude(amount=F12_DEPTH)


solid = Compound([f1.part, f5.part, f8.part])
